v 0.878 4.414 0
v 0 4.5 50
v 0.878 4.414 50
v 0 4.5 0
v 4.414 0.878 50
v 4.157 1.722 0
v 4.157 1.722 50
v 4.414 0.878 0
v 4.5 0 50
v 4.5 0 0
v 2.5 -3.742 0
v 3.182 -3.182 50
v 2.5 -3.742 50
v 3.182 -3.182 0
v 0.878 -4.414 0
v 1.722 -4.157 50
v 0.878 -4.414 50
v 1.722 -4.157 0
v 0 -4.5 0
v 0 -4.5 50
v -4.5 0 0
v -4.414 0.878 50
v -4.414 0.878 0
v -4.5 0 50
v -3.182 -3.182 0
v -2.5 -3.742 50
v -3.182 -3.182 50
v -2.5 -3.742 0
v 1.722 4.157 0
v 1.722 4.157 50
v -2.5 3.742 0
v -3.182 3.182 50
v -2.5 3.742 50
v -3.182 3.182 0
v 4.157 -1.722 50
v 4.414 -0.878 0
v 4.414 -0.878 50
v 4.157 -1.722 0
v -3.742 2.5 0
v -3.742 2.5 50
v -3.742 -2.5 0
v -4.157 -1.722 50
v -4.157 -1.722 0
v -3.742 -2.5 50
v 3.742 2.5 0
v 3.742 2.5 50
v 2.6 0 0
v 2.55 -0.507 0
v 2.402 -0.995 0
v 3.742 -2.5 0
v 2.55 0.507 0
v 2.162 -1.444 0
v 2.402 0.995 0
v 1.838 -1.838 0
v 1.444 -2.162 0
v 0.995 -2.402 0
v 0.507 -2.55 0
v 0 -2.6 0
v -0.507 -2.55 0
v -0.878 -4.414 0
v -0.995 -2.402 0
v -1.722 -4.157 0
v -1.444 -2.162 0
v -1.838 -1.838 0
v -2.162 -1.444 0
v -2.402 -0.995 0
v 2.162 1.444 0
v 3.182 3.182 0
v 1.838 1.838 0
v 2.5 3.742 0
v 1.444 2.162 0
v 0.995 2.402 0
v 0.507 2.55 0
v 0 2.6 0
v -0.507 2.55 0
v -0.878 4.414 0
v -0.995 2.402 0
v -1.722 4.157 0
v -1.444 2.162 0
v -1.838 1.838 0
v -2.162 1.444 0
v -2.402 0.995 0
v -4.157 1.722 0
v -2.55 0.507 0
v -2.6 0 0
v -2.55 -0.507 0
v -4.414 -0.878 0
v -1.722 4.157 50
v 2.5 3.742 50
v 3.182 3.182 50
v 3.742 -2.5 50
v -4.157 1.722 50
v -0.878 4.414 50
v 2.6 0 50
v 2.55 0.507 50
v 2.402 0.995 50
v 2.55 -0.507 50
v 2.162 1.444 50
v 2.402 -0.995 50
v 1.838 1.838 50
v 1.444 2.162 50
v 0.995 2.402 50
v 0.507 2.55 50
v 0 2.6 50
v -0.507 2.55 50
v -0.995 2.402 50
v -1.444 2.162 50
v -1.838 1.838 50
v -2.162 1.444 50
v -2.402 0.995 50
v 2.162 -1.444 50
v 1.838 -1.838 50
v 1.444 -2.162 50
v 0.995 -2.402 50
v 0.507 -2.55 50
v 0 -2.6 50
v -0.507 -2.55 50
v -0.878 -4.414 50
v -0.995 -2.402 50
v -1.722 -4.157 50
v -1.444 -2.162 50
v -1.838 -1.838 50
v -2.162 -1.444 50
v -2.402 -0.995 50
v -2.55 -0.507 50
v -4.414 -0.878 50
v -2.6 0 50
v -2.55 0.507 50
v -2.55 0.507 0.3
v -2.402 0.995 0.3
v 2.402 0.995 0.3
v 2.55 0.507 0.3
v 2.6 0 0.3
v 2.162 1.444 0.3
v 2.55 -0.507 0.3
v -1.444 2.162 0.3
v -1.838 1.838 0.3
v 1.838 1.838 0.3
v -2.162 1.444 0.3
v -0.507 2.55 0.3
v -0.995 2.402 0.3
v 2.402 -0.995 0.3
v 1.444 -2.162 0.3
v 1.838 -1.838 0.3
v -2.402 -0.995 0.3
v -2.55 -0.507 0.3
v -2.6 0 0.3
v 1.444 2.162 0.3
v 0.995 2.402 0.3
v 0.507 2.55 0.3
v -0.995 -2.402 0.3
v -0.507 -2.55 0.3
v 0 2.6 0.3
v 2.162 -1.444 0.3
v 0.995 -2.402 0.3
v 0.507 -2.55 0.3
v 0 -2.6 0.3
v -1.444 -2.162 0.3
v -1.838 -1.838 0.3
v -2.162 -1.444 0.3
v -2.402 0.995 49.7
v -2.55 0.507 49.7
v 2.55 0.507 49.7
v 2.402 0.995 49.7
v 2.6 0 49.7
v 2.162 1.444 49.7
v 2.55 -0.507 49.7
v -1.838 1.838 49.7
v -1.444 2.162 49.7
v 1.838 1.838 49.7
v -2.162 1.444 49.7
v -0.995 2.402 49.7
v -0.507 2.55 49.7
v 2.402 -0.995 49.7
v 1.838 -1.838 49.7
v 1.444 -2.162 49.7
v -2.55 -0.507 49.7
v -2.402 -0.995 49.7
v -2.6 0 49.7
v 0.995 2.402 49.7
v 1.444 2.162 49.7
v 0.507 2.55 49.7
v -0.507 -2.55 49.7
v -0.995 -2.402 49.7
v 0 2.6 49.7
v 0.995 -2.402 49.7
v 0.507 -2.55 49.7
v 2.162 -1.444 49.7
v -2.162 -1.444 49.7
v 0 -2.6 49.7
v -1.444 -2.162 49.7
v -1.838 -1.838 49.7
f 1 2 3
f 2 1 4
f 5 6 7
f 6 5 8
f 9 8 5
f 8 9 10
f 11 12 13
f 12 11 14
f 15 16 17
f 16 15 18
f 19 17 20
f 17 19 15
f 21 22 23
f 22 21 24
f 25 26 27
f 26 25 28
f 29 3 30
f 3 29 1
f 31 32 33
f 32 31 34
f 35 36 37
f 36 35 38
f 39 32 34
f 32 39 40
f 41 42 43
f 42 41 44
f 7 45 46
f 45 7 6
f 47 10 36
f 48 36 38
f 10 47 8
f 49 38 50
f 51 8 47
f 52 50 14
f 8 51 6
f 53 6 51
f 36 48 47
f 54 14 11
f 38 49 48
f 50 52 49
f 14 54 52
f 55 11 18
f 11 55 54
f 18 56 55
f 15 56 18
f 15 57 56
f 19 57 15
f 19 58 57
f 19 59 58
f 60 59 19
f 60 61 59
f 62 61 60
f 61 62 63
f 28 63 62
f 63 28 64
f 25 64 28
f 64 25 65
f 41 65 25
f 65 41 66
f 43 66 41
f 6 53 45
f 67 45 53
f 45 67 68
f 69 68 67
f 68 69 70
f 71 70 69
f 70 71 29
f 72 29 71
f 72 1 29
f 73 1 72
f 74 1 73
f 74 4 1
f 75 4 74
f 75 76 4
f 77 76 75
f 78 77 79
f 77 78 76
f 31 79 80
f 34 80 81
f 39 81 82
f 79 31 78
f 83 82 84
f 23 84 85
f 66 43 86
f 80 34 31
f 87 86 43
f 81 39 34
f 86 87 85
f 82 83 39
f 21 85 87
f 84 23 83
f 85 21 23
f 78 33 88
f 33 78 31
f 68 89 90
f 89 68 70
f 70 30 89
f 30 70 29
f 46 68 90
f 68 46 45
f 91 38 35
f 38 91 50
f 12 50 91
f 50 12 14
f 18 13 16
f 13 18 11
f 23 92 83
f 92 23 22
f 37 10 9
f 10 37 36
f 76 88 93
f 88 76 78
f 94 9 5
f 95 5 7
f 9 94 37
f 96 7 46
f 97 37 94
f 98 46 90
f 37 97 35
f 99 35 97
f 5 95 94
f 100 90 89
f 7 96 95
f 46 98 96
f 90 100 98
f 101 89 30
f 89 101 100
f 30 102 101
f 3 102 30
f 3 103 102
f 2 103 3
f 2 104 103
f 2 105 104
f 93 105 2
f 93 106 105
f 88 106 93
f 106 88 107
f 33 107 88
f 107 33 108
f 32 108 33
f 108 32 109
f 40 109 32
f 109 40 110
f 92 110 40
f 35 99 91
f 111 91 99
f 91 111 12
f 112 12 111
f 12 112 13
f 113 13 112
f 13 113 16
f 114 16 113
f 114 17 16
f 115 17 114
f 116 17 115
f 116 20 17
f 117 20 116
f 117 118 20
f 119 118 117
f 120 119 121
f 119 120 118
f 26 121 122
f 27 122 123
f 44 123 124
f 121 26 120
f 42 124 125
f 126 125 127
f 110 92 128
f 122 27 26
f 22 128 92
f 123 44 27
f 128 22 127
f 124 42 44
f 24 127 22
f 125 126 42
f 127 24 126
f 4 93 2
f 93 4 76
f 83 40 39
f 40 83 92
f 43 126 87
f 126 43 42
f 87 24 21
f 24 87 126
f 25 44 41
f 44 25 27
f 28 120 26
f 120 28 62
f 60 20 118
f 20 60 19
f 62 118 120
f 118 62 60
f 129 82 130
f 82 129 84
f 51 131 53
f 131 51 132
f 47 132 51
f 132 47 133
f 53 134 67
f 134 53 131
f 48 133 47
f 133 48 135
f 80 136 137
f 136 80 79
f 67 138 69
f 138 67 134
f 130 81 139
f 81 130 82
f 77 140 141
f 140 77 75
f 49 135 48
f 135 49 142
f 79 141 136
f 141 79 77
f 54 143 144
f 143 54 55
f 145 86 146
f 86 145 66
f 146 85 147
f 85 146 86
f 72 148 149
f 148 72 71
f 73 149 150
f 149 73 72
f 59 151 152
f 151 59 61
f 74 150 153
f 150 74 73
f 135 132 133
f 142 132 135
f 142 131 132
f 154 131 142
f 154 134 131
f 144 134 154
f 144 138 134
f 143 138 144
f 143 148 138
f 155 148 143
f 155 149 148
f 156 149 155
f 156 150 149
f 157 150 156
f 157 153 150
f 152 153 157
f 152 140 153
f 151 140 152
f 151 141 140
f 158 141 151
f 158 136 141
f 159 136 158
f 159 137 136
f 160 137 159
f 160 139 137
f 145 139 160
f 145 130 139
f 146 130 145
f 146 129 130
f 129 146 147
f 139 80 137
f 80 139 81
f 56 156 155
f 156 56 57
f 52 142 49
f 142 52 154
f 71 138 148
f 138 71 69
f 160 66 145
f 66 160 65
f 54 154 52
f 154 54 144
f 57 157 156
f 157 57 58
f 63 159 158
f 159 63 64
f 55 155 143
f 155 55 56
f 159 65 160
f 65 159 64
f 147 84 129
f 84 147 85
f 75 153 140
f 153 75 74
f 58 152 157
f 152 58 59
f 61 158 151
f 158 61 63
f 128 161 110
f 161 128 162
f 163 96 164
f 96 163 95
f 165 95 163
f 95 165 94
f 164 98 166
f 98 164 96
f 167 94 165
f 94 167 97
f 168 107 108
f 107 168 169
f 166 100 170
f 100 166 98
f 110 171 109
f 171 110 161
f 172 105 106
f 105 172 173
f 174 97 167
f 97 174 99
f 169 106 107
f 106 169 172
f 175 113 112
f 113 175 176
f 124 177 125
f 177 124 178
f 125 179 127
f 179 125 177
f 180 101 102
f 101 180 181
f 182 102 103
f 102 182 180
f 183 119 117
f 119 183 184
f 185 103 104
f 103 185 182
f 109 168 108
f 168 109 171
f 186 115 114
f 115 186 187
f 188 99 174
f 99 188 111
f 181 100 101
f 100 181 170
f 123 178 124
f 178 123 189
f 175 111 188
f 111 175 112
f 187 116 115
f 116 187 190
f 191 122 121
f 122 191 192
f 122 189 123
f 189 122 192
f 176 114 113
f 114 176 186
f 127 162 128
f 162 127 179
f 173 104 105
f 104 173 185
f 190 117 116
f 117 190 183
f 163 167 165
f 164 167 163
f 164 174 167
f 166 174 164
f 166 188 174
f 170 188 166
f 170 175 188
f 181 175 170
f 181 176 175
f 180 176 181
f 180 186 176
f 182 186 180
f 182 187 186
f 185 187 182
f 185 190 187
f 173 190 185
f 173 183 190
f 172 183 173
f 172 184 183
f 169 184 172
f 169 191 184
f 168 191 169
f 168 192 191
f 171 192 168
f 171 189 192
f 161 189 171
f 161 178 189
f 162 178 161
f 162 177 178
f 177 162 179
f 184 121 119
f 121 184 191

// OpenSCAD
//use <ballJoint.scad>

$fn=32;

BJ_R=5;                 //  internal radius
BJ_FOUNDATION_H=BJ_R/4; //  foundation dist
BJ_FOUNDATION_R=BJ_R/2; //  foundation r
BJ_W=1.2;               //  wall width
BJ_SPACING=-.1;          //  extra spacing between b&j
BJ_JLEN_RATIO=1.5;      //  1=half ; 2=closed
BJ_CLAW_CNT=4;
BJ_CUTOUT_WIDTH=3;
BJ_CUTOUT_HEIGHT=8;
    
module  bj_ball() {
    
    translate([0,0,BJ_R+BJ_FOUNDATION_H])
        sphere(r=BJ_R,center=true);
    cylinder(r=BJ_FOUNDATION_R,h=BJ_FOUNDATION_H+BJ_R);
}


module  bj_socket() {
    
    translate([0,0,BJ_R+BJ_W+BJ_FOUNDATION_H])
    difference() {
        sphere(r=BJ_R+BJ_W,center=true);
        sphere(r=BJ_R+BJ_SPACING,center=true);
        translate([0,0,BJ_R*BJ_JLEN_RATIO])
            cube([100,100,BJ_R*2],center=true);
        
        for(i=[1:BJ_CLAW_CNT]){
            a=i*360/BJ_CLAW_CNT;
            translate([sin(a)*BJ_R,cos(a)*BJ_R,0])
            rotate(-a)
            cube([BJ_CUTOUT_WIDTH,BJ_R*2,BJ_CUTOUT_HEIGHT],center=true);
        }
    }
    cylinder(r=BJ_FOUNDATION_R,h=BJ_FOUNDATION_H+BJ_W/2);

}


module suspension(){
    
    A=6;    // hole2edge
    D=8;    // acryl diam
    W=2;

    difference() {
        translate([(W+A+D)/2,0,0])
        cube([W+A+D,30,D+2*W],center=true);
        
        translate([A+D,0,0])
        translate([-50,0,0])
        cube([100,100,D],center=true);

        translate([D,0,0])
        cylinder(d=3.2,h=30,center=true);
        
        translate([(W+A+D),0,0])
        rotate(90,[0,1,0])
        cylinder(r=BJ_FOUNDATION_R+.1,h=.6,center=true);
    }
}

module intermediate(){
    W=2;
    L=50;
    difference() {
        cylinder(r=BJ_FOUNDATION_R+W,h=L);
//        translate([(W+A+D)/2,0,0])
        cylinder(r=BJ_FOUNDATION_R+.1,h=.6,center=true);
        translate([0,0,L])
        cylinder(r=BJ_FOUNDATION_R+.1,h=.6,center=true);
    }
}

mode="intermediate";
if(mode == "bj") {
    bj_ball();
    translate([BJ_R*2+2*BJ_W,0,0])
    bj_socket();
}
if(mode == "suspension") {
    rotate(90,[0,1,0])
    suspension();
}

if(mode == "intermediate") {
    intermediate();
}

if(mode == "mount") {
    cube();
}
